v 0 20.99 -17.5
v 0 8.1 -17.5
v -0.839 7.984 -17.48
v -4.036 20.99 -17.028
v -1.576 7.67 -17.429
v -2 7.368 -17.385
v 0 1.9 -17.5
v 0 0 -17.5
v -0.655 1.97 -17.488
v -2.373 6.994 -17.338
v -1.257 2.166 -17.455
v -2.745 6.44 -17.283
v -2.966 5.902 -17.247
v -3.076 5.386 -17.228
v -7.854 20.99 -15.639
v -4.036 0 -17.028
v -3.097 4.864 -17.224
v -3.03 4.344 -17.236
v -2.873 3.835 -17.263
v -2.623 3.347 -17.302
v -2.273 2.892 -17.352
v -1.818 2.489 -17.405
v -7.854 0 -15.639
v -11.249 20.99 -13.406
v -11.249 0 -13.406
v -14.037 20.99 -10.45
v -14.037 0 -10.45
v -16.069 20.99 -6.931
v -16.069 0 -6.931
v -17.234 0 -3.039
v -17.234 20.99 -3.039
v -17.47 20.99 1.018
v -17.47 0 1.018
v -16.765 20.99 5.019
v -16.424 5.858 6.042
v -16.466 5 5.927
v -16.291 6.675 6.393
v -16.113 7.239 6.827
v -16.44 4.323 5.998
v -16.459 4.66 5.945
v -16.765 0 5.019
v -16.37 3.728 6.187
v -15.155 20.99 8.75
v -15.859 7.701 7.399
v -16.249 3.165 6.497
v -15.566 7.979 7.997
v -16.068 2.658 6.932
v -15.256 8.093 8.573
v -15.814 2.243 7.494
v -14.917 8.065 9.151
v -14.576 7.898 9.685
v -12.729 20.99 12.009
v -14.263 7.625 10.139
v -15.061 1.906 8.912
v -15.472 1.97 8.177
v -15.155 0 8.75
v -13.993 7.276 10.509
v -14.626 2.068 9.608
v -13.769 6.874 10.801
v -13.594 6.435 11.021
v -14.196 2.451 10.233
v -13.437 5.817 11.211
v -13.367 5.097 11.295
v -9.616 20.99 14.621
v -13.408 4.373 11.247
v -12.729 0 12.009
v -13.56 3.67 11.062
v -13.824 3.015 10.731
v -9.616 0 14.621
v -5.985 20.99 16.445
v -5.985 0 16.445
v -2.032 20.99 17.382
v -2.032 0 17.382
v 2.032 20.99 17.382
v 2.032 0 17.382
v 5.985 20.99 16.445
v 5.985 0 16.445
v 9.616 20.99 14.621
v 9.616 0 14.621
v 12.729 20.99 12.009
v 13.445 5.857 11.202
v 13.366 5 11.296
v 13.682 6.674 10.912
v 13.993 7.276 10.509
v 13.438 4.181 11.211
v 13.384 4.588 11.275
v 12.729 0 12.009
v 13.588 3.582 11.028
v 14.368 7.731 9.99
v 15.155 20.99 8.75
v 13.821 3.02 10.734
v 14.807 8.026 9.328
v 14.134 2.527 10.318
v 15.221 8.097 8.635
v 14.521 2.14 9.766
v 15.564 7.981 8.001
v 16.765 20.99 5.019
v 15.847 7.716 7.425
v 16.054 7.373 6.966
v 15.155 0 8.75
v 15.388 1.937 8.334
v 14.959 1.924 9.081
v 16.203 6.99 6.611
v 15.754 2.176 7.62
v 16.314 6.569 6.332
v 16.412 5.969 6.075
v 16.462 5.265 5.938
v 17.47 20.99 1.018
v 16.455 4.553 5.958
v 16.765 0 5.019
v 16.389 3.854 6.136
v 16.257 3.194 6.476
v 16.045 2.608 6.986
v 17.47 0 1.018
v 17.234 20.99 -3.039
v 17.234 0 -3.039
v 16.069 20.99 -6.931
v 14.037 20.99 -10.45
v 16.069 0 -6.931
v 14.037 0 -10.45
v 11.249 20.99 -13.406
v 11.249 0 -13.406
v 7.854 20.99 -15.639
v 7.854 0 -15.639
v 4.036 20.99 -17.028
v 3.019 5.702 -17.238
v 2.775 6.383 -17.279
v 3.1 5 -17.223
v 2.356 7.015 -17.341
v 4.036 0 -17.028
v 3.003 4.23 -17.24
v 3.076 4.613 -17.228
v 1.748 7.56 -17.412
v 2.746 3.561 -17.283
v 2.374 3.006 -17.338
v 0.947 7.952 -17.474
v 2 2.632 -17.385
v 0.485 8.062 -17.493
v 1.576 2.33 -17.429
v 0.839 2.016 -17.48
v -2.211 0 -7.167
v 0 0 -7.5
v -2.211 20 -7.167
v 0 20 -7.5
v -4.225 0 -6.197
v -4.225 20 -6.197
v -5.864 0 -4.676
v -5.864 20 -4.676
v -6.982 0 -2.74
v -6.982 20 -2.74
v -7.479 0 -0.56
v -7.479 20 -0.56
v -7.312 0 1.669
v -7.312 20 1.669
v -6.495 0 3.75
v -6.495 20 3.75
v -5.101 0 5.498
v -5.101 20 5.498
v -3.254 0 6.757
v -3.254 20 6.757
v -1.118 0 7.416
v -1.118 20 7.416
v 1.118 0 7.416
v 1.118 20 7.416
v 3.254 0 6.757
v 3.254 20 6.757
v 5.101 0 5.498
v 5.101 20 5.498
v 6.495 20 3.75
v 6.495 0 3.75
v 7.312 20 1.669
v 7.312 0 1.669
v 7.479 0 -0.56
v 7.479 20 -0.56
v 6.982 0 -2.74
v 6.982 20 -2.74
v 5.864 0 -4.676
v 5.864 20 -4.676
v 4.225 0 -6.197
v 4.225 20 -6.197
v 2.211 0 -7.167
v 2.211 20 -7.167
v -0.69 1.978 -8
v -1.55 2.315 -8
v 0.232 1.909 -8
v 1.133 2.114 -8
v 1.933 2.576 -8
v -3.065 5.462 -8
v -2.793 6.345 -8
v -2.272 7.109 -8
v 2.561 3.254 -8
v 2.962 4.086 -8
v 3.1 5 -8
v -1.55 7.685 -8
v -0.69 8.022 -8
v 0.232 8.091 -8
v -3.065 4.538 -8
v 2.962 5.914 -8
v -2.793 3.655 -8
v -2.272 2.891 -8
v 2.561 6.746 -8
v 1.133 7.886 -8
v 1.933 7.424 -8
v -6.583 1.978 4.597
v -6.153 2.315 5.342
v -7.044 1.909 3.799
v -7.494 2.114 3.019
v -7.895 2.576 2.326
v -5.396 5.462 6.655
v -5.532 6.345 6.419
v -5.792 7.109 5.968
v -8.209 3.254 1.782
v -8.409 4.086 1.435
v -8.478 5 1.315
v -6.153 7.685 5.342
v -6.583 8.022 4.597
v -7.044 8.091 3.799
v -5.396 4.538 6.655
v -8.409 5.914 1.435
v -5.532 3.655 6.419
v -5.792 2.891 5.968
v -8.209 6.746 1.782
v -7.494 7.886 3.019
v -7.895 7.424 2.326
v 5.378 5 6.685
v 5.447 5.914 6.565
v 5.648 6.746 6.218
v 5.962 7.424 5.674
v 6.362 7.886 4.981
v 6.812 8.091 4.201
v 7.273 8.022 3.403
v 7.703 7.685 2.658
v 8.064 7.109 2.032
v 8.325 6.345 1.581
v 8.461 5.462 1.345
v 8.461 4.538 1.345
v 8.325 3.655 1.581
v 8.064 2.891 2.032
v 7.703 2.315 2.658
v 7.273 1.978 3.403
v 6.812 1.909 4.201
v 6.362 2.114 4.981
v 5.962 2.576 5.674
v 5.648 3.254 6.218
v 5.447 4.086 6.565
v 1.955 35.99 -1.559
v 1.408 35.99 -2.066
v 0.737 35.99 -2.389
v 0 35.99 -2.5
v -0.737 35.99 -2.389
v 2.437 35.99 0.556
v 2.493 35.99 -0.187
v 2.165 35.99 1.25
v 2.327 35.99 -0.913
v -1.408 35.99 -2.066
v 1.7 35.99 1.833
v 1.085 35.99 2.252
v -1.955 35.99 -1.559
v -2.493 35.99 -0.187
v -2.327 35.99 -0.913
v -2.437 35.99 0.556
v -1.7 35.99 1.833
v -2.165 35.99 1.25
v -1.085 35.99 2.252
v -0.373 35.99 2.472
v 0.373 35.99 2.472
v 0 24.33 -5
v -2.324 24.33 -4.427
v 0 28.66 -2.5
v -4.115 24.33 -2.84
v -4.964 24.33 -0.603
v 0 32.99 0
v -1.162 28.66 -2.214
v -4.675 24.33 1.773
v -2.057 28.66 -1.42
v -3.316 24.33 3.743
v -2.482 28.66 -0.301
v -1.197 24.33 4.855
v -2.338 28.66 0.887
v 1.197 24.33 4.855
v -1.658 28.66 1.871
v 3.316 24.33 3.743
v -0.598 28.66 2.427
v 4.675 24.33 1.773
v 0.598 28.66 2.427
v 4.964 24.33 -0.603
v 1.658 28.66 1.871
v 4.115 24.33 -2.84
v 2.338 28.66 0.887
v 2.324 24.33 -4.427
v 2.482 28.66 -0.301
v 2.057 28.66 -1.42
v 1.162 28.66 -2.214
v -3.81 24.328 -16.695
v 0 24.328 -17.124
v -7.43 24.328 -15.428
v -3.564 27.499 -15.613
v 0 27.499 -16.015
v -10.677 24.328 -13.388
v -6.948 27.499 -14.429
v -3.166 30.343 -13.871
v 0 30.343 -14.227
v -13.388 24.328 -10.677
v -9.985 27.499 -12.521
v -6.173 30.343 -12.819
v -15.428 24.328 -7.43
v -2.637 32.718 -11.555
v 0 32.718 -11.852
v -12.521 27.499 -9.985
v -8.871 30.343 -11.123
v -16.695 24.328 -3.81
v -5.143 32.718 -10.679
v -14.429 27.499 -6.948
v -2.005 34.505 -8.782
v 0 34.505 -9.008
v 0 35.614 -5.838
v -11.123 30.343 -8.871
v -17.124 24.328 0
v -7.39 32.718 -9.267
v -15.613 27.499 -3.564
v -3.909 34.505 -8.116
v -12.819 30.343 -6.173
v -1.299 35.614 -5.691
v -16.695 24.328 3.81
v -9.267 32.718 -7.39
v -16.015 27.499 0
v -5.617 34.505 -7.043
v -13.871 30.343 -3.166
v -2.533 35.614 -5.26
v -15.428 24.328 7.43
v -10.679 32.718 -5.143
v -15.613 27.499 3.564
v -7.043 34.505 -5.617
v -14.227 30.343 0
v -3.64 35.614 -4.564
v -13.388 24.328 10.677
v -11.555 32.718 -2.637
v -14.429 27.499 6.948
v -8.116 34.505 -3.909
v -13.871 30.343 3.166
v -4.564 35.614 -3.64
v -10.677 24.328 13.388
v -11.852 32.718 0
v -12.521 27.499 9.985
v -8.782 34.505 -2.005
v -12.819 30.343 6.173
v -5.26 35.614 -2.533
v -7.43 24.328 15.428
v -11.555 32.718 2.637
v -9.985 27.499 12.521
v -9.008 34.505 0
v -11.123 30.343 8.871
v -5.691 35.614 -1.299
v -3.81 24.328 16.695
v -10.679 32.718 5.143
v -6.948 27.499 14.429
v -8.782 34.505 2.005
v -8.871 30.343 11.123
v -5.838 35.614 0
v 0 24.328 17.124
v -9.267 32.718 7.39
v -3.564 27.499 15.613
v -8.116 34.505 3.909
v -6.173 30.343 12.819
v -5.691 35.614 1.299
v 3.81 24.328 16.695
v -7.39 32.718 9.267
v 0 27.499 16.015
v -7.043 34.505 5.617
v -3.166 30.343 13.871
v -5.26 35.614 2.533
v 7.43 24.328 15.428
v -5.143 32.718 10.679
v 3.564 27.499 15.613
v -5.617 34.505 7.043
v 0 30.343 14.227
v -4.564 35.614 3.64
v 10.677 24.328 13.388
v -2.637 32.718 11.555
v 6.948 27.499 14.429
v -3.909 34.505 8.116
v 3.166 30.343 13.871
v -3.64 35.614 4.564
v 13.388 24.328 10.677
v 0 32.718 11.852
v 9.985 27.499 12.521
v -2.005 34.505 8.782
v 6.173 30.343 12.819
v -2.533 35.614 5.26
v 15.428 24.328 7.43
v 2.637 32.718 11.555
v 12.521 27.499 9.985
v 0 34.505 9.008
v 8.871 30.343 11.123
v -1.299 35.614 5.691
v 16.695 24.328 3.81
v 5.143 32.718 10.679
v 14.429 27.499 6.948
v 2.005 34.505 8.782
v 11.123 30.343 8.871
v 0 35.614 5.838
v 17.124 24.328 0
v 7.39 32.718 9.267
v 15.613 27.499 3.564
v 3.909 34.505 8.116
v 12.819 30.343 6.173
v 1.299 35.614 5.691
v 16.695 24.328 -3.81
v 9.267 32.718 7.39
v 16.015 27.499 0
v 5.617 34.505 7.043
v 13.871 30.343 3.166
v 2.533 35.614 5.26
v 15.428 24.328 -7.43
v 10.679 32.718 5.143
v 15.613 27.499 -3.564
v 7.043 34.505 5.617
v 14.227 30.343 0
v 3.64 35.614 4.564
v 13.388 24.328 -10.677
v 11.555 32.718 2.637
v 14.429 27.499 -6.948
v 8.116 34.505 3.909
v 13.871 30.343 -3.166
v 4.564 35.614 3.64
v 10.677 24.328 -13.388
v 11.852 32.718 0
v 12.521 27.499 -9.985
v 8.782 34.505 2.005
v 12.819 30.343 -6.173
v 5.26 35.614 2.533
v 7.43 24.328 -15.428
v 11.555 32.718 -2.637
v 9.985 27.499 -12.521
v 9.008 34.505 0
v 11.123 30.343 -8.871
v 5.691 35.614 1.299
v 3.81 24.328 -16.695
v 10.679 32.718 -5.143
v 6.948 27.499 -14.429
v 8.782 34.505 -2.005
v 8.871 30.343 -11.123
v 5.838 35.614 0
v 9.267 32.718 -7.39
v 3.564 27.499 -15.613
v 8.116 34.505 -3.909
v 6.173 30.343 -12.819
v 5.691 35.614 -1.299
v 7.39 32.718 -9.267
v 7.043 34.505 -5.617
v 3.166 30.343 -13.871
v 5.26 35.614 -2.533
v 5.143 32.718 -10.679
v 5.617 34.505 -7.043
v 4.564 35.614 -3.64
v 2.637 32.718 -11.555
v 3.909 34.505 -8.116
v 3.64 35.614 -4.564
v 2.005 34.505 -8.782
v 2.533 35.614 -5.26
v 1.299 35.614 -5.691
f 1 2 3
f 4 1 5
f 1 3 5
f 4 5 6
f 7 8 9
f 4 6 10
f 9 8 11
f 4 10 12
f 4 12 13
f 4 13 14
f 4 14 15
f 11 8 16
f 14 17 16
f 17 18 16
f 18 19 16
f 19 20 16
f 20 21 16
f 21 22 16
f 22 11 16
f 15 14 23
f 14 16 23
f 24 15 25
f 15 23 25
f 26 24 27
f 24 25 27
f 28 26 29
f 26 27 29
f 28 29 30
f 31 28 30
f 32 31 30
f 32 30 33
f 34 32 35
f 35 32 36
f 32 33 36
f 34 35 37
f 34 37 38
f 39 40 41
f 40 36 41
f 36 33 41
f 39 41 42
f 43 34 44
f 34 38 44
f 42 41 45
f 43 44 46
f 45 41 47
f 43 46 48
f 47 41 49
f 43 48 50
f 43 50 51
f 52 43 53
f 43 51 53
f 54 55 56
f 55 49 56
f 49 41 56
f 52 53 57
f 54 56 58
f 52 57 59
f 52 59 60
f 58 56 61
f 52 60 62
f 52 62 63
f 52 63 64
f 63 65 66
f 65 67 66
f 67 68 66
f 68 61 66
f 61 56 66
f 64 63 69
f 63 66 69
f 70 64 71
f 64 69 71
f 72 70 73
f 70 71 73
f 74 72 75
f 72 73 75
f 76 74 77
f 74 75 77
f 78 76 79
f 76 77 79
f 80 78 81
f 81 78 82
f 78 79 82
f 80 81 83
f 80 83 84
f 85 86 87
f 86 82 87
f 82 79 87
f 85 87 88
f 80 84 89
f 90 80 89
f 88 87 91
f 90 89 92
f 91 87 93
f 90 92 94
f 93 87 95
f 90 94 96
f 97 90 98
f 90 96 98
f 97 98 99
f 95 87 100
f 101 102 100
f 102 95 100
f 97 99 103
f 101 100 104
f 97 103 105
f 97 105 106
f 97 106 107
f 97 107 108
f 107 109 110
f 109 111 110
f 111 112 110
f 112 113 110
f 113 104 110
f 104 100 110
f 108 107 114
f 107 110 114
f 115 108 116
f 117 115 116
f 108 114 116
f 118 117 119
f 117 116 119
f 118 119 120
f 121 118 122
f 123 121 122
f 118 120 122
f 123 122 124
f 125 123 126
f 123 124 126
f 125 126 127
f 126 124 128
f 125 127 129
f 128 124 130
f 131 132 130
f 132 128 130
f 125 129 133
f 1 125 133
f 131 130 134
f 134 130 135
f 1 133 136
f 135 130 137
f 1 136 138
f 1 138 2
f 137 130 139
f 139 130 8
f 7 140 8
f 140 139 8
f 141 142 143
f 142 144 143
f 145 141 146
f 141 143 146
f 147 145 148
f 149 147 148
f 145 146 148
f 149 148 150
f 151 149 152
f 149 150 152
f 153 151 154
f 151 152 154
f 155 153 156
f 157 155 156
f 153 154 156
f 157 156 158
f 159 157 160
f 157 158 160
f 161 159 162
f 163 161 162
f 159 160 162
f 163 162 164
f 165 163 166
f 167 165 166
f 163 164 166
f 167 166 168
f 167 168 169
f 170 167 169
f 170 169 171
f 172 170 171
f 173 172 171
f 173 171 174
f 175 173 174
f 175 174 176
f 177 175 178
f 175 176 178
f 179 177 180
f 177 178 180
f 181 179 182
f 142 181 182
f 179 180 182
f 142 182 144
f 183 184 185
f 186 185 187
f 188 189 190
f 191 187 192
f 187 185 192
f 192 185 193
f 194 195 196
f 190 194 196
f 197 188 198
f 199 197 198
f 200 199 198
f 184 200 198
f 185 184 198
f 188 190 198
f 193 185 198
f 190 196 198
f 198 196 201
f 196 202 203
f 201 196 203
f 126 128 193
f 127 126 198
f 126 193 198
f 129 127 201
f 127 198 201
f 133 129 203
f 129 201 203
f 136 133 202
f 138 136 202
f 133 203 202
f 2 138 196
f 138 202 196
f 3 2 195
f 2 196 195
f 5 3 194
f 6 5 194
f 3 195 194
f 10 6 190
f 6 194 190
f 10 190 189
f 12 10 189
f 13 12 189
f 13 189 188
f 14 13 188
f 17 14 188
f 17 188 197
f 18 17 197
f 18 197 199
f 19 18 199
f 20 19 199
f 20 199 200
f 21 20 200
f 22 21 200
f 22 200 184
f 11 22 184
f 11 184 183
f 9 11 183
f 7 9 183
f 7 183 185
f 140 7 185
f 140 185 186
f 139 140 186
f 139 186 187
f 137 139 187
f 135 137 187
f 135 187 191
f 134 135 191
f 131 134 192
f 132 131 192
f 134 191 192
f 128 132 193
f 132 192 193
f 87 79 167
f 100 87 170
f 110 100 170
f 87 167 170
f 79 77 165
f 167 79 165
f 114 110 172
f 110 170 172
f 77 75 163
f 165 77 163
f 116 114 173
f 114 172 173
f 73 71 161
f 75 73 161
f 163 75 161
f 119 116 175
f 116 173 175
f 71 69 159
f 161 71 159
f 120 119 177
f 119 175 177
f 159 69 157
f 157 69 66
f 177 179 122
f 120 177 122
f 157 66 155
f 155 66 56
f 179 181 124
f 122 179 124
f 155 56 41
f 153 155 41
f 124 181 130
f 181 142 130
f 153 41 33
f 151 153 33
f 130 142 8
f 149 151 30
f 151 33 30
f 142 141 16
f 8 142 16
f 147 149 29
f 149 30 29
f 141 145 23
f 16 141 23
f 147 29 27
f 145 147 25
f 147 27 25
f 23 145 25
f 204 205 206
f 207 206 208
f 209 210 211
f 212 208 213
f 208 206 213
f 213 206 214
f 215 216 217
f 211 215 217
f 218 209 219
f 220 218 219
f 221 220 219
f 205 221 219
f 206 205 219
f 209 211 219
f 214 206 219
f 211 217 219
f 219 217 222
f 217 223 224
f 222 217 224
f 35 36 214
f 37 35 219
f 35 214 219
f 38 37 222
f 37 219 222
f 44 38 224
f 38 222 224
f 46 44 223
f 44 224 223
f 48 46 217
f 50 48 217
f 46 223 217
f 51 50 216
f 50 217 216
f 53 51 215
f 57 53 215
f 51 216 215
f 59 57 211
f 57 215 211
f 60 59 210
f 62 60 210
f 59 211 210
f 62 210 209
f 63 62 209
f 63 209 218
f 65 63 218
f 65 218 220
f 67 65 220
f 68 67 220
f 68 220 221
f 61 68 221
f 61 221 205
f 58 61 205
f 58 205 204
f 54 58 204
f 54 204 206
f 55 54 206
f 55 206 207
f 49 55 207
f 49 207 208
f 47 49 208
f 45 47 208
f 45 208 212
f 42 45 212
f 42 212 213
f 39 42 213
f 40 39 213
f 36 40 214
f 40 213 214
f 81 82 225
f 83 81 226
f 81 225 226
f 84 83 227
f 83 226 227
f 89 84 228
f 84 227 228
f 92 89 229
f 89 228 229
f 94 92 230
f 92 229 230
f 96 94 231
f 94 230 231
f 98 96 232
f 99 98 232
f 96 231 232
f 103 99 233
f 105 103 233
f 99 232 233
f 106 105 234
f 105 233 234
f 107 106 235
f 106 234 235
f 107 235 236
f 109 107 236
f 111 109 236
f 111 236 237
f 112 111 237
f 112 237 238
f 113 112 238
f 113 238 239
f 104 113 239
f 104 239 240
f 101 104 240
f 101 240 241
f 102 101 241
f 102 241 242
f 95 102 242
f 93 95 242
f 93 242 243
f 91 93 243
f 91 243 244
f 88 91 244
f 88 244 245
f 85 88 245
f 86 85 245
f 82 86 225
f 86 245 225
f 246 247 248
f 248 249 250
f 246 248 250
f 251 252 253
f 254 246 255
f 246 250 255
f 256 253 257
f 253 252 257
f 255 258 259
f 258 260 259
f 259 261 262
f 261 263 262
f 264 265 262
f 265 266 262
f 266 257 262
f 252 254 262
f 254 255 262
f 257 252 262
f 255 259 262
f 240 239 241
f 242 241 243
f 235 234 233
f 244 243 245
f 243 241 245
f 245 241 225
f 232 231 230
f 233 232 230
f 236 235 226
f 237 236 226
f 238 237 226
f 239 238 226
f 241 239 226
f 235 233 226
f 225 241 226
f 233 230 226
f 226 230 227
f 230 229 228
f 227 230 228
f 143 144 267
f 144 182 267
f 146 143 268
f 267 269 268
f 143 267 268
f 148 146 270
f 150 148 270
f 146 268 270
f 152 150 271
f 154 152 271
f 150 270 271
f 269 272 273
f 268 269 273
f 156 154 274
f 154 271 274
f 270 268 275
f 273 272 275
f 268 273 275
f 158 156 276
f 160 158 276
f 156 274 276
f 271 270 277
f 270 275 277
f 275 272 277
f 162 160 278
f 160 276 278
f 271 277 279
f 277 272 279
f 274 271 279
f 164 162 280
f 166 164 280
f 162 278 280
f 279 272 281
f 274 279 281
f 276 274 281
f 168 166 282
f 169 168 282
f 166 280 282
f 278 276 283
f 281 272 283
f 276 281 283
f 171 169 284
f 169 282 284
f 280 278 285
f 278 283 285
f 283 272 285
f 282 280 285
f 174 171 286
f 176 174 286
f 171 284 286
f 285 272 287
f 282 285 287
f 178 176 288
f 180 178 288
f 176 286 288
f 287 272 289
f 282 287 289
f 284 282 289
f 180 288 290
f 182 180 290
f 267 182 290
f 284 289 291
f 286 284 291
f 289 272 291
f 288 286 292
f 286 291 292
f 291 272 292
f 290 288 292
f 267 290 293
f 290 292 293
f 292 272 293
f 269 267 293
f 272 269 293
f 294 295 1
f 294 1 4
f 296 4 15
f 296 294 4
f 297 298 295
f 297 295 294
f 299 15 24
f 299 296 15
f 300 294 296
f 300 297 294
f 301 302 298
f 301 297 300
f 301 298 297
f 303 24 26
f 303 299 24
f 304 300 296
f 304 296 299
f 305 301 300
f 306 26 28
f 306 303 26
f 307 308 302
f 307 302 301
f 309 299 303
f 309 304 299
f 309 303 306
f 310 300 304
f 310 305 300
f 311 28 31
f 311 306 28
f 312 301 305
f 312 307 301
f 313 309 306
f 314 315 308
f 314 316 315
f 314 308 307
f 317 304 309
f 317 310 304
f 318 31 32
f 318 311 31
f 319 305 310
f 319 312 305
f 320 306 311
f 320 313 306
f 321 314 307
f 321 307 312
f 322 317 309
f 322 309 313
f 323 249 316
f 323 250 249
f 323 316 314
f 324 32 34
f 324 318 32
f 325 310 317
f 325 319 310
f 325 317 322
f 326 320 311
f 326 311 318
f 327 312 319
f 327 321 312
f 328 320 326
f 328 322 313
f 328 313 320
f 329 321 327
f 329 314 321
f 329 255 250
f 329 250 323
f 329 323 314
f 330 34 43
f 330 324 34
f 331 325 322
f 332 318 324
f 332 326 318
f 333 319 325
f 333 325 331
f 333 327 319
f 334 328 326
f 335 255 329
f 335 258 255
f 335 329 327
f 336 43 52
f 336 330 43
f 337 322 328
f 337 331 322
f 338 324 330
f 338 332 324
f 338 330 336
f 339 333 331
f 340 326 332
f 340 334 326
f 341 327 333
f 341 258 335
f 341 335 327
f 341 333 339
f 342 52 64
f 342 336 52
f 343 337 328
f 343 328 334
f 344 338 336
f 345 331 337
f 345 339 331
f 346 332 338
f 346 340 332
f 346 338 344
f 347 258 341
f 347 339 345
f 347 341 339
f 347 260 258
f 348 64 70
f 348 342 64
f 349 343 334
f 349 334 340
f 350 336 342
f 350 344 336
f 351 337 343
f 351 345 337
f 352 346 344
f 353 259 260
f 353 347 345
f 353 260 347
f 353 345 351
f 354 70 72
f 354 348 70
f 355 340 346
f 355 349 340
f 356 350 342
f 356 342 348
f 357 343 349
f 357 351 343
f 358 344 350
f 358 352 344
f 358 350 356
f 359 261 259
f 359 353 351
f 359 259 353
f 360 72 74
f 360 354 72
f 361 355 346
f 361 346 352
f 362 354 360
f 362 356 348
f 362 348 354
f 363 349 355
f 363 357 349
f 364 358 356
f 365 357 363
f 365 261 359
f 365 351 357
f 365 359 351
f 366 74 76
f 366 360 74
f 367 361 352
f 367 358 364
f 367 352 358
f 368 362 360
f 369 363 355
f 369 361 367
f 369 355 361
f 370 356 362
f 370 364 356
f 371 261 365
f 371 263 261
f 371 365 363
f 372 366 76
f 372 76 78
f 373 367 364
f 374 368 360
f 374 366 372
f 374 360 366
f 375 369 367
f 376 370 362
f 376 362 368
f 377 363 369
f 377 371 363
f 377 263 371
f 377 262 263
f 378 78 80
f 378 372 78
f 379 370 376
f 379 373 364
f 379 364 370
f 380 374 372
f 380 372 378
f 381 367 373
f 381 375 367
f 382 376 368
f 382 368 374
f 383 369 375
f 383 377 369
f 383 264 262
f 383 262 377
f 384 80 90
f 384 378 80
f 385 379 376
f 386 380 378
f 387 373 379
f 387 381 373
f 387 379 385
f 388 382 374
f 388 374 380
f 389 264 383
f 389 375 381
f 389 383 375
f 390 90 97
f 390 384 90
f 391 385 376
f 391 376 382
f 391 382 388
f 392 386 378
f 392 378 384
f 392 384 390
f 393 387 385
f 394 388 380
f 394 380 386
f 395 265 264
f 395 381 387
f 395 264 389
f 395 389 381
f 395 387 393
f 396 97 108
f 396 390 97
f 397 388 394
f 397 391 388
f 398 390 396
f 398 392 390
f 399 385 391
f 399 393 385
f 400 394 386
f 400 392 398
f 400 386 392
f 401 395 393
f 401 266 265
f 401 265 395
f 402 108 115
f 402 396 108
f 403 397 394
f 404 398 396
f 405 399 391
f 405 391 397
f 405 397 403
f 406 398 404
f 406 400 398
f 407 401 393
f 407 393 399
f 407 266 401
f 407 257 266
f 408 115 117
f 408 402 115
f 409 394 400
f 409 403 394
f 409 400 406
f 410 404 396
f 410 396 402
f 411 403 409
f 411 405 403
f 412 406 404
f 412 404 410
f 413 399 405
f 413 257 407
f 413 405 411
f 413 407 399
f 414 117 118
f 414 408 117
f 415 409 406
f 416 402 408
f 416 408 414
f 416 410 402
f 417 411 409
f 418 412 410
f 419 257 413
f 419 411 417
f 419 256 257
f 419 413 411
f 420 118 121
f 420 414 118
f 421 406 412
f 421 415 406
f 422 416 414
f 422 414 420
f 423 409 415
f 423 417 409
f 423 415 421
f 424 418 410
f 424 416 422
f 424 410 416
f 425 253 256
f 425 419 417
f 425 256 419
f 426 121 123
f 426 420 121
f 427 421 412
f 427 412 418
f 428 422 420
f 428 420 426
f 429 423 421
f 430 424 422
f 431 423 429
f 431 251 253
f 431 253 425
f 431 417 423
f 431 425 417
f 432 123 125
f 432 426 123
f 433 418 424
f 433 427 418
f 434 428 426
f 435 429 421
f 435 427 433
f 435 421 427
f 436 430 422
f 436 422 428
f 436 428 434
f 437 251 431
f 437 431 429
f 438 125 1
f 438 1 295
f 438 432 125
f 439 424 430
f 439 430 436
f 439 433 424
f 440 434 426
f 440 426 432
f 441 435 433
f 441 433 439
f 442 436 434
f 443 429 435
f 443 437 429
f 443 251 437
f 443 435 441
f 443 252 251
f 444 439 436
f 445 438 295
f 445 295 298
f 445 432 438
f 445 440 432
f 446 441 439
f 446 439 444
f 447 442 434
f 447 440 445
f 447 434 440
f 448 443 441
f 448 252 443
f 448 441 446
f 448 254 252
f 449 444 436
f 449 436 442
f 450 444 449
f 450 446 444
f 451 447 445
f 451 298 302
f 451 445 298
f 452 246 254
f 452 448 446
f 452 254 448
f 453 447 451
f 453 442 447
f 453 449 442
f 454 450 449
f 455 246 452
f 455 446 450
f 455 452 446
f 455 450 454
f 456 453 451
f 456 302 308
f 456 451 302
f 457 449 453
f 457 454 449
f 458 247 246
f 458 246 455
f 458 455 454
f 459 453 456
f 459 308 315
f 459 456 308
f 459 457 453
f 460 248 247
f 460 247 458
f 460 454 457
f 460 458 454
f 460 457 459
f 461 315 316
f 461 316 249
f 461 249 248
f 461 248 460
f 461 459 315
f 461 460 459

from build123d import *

# Parameters (mm, degrees)
ENL_V_START                  = -8
ESQUISSE2_R                  = 3.1
ENL_V_MAT_EXTRU_1_DEPTH      = 30
R_P_TITION_CIRCULAIRE1_COUNT = 3
CONG_1_R                     = 15


with BuildPart() as part:
    # Esquisse1 → Révolution1 (revolve)
    with BuildSketch(Plane.XY, mode=Mode.PRIVATE) as r_volution1_sk:
        Polygon((7.5, 20), (0, 32.990381057), (0, 35.990381057), (17.5, 35.990381057), (17.5, 0), (7.5, 0), align=None)
    revolve(r_volution1_sk.sketch.rotate(Axis((0, 0, 0), (0, 1, 0)), 90), axis=Axis((0, 0, 0), (0, 1, 0)))

    # Esquisse2 → Enlèv. mat.-Extru.1 (cut)
    with BuildSketch(Plane.XY.offset(ENL_V_START)):
        with Locations((0, 5)):
            Circle(ESQUISSE2_R)
    enl_v_mat_extru_1 = extrude(amount=-ENL_V_MAT_EXTRU_1_DEPTH, mode=Mode.SUBTRACT)

    # Répétition circulaire1: Enlèv. mat.-Extru.1 ×3 about axis
    r_p_tition_circulaire1_axis = Axis((0, 0, 0), (0, 1, 0))
    for i in range(1, R_P_TITION_CIRCULAIRE1_COUNT):
        add(enl_v_mat_extru_1.rotate(r_p_tition_circulaire1_axis, i * 360 / R_P_TITION_CIRCULAIRE1_COUNT), mode=Mode.SUBTRACT)

    # Congé1
    cong_1_edges = [part.edges().sort_by_distance(p)[0] for p in [
        (0, 35.990381057, 17.5),
    ]]
    fillet(cong_1_edges, radius=CONG_1_R)


solid = part.part
